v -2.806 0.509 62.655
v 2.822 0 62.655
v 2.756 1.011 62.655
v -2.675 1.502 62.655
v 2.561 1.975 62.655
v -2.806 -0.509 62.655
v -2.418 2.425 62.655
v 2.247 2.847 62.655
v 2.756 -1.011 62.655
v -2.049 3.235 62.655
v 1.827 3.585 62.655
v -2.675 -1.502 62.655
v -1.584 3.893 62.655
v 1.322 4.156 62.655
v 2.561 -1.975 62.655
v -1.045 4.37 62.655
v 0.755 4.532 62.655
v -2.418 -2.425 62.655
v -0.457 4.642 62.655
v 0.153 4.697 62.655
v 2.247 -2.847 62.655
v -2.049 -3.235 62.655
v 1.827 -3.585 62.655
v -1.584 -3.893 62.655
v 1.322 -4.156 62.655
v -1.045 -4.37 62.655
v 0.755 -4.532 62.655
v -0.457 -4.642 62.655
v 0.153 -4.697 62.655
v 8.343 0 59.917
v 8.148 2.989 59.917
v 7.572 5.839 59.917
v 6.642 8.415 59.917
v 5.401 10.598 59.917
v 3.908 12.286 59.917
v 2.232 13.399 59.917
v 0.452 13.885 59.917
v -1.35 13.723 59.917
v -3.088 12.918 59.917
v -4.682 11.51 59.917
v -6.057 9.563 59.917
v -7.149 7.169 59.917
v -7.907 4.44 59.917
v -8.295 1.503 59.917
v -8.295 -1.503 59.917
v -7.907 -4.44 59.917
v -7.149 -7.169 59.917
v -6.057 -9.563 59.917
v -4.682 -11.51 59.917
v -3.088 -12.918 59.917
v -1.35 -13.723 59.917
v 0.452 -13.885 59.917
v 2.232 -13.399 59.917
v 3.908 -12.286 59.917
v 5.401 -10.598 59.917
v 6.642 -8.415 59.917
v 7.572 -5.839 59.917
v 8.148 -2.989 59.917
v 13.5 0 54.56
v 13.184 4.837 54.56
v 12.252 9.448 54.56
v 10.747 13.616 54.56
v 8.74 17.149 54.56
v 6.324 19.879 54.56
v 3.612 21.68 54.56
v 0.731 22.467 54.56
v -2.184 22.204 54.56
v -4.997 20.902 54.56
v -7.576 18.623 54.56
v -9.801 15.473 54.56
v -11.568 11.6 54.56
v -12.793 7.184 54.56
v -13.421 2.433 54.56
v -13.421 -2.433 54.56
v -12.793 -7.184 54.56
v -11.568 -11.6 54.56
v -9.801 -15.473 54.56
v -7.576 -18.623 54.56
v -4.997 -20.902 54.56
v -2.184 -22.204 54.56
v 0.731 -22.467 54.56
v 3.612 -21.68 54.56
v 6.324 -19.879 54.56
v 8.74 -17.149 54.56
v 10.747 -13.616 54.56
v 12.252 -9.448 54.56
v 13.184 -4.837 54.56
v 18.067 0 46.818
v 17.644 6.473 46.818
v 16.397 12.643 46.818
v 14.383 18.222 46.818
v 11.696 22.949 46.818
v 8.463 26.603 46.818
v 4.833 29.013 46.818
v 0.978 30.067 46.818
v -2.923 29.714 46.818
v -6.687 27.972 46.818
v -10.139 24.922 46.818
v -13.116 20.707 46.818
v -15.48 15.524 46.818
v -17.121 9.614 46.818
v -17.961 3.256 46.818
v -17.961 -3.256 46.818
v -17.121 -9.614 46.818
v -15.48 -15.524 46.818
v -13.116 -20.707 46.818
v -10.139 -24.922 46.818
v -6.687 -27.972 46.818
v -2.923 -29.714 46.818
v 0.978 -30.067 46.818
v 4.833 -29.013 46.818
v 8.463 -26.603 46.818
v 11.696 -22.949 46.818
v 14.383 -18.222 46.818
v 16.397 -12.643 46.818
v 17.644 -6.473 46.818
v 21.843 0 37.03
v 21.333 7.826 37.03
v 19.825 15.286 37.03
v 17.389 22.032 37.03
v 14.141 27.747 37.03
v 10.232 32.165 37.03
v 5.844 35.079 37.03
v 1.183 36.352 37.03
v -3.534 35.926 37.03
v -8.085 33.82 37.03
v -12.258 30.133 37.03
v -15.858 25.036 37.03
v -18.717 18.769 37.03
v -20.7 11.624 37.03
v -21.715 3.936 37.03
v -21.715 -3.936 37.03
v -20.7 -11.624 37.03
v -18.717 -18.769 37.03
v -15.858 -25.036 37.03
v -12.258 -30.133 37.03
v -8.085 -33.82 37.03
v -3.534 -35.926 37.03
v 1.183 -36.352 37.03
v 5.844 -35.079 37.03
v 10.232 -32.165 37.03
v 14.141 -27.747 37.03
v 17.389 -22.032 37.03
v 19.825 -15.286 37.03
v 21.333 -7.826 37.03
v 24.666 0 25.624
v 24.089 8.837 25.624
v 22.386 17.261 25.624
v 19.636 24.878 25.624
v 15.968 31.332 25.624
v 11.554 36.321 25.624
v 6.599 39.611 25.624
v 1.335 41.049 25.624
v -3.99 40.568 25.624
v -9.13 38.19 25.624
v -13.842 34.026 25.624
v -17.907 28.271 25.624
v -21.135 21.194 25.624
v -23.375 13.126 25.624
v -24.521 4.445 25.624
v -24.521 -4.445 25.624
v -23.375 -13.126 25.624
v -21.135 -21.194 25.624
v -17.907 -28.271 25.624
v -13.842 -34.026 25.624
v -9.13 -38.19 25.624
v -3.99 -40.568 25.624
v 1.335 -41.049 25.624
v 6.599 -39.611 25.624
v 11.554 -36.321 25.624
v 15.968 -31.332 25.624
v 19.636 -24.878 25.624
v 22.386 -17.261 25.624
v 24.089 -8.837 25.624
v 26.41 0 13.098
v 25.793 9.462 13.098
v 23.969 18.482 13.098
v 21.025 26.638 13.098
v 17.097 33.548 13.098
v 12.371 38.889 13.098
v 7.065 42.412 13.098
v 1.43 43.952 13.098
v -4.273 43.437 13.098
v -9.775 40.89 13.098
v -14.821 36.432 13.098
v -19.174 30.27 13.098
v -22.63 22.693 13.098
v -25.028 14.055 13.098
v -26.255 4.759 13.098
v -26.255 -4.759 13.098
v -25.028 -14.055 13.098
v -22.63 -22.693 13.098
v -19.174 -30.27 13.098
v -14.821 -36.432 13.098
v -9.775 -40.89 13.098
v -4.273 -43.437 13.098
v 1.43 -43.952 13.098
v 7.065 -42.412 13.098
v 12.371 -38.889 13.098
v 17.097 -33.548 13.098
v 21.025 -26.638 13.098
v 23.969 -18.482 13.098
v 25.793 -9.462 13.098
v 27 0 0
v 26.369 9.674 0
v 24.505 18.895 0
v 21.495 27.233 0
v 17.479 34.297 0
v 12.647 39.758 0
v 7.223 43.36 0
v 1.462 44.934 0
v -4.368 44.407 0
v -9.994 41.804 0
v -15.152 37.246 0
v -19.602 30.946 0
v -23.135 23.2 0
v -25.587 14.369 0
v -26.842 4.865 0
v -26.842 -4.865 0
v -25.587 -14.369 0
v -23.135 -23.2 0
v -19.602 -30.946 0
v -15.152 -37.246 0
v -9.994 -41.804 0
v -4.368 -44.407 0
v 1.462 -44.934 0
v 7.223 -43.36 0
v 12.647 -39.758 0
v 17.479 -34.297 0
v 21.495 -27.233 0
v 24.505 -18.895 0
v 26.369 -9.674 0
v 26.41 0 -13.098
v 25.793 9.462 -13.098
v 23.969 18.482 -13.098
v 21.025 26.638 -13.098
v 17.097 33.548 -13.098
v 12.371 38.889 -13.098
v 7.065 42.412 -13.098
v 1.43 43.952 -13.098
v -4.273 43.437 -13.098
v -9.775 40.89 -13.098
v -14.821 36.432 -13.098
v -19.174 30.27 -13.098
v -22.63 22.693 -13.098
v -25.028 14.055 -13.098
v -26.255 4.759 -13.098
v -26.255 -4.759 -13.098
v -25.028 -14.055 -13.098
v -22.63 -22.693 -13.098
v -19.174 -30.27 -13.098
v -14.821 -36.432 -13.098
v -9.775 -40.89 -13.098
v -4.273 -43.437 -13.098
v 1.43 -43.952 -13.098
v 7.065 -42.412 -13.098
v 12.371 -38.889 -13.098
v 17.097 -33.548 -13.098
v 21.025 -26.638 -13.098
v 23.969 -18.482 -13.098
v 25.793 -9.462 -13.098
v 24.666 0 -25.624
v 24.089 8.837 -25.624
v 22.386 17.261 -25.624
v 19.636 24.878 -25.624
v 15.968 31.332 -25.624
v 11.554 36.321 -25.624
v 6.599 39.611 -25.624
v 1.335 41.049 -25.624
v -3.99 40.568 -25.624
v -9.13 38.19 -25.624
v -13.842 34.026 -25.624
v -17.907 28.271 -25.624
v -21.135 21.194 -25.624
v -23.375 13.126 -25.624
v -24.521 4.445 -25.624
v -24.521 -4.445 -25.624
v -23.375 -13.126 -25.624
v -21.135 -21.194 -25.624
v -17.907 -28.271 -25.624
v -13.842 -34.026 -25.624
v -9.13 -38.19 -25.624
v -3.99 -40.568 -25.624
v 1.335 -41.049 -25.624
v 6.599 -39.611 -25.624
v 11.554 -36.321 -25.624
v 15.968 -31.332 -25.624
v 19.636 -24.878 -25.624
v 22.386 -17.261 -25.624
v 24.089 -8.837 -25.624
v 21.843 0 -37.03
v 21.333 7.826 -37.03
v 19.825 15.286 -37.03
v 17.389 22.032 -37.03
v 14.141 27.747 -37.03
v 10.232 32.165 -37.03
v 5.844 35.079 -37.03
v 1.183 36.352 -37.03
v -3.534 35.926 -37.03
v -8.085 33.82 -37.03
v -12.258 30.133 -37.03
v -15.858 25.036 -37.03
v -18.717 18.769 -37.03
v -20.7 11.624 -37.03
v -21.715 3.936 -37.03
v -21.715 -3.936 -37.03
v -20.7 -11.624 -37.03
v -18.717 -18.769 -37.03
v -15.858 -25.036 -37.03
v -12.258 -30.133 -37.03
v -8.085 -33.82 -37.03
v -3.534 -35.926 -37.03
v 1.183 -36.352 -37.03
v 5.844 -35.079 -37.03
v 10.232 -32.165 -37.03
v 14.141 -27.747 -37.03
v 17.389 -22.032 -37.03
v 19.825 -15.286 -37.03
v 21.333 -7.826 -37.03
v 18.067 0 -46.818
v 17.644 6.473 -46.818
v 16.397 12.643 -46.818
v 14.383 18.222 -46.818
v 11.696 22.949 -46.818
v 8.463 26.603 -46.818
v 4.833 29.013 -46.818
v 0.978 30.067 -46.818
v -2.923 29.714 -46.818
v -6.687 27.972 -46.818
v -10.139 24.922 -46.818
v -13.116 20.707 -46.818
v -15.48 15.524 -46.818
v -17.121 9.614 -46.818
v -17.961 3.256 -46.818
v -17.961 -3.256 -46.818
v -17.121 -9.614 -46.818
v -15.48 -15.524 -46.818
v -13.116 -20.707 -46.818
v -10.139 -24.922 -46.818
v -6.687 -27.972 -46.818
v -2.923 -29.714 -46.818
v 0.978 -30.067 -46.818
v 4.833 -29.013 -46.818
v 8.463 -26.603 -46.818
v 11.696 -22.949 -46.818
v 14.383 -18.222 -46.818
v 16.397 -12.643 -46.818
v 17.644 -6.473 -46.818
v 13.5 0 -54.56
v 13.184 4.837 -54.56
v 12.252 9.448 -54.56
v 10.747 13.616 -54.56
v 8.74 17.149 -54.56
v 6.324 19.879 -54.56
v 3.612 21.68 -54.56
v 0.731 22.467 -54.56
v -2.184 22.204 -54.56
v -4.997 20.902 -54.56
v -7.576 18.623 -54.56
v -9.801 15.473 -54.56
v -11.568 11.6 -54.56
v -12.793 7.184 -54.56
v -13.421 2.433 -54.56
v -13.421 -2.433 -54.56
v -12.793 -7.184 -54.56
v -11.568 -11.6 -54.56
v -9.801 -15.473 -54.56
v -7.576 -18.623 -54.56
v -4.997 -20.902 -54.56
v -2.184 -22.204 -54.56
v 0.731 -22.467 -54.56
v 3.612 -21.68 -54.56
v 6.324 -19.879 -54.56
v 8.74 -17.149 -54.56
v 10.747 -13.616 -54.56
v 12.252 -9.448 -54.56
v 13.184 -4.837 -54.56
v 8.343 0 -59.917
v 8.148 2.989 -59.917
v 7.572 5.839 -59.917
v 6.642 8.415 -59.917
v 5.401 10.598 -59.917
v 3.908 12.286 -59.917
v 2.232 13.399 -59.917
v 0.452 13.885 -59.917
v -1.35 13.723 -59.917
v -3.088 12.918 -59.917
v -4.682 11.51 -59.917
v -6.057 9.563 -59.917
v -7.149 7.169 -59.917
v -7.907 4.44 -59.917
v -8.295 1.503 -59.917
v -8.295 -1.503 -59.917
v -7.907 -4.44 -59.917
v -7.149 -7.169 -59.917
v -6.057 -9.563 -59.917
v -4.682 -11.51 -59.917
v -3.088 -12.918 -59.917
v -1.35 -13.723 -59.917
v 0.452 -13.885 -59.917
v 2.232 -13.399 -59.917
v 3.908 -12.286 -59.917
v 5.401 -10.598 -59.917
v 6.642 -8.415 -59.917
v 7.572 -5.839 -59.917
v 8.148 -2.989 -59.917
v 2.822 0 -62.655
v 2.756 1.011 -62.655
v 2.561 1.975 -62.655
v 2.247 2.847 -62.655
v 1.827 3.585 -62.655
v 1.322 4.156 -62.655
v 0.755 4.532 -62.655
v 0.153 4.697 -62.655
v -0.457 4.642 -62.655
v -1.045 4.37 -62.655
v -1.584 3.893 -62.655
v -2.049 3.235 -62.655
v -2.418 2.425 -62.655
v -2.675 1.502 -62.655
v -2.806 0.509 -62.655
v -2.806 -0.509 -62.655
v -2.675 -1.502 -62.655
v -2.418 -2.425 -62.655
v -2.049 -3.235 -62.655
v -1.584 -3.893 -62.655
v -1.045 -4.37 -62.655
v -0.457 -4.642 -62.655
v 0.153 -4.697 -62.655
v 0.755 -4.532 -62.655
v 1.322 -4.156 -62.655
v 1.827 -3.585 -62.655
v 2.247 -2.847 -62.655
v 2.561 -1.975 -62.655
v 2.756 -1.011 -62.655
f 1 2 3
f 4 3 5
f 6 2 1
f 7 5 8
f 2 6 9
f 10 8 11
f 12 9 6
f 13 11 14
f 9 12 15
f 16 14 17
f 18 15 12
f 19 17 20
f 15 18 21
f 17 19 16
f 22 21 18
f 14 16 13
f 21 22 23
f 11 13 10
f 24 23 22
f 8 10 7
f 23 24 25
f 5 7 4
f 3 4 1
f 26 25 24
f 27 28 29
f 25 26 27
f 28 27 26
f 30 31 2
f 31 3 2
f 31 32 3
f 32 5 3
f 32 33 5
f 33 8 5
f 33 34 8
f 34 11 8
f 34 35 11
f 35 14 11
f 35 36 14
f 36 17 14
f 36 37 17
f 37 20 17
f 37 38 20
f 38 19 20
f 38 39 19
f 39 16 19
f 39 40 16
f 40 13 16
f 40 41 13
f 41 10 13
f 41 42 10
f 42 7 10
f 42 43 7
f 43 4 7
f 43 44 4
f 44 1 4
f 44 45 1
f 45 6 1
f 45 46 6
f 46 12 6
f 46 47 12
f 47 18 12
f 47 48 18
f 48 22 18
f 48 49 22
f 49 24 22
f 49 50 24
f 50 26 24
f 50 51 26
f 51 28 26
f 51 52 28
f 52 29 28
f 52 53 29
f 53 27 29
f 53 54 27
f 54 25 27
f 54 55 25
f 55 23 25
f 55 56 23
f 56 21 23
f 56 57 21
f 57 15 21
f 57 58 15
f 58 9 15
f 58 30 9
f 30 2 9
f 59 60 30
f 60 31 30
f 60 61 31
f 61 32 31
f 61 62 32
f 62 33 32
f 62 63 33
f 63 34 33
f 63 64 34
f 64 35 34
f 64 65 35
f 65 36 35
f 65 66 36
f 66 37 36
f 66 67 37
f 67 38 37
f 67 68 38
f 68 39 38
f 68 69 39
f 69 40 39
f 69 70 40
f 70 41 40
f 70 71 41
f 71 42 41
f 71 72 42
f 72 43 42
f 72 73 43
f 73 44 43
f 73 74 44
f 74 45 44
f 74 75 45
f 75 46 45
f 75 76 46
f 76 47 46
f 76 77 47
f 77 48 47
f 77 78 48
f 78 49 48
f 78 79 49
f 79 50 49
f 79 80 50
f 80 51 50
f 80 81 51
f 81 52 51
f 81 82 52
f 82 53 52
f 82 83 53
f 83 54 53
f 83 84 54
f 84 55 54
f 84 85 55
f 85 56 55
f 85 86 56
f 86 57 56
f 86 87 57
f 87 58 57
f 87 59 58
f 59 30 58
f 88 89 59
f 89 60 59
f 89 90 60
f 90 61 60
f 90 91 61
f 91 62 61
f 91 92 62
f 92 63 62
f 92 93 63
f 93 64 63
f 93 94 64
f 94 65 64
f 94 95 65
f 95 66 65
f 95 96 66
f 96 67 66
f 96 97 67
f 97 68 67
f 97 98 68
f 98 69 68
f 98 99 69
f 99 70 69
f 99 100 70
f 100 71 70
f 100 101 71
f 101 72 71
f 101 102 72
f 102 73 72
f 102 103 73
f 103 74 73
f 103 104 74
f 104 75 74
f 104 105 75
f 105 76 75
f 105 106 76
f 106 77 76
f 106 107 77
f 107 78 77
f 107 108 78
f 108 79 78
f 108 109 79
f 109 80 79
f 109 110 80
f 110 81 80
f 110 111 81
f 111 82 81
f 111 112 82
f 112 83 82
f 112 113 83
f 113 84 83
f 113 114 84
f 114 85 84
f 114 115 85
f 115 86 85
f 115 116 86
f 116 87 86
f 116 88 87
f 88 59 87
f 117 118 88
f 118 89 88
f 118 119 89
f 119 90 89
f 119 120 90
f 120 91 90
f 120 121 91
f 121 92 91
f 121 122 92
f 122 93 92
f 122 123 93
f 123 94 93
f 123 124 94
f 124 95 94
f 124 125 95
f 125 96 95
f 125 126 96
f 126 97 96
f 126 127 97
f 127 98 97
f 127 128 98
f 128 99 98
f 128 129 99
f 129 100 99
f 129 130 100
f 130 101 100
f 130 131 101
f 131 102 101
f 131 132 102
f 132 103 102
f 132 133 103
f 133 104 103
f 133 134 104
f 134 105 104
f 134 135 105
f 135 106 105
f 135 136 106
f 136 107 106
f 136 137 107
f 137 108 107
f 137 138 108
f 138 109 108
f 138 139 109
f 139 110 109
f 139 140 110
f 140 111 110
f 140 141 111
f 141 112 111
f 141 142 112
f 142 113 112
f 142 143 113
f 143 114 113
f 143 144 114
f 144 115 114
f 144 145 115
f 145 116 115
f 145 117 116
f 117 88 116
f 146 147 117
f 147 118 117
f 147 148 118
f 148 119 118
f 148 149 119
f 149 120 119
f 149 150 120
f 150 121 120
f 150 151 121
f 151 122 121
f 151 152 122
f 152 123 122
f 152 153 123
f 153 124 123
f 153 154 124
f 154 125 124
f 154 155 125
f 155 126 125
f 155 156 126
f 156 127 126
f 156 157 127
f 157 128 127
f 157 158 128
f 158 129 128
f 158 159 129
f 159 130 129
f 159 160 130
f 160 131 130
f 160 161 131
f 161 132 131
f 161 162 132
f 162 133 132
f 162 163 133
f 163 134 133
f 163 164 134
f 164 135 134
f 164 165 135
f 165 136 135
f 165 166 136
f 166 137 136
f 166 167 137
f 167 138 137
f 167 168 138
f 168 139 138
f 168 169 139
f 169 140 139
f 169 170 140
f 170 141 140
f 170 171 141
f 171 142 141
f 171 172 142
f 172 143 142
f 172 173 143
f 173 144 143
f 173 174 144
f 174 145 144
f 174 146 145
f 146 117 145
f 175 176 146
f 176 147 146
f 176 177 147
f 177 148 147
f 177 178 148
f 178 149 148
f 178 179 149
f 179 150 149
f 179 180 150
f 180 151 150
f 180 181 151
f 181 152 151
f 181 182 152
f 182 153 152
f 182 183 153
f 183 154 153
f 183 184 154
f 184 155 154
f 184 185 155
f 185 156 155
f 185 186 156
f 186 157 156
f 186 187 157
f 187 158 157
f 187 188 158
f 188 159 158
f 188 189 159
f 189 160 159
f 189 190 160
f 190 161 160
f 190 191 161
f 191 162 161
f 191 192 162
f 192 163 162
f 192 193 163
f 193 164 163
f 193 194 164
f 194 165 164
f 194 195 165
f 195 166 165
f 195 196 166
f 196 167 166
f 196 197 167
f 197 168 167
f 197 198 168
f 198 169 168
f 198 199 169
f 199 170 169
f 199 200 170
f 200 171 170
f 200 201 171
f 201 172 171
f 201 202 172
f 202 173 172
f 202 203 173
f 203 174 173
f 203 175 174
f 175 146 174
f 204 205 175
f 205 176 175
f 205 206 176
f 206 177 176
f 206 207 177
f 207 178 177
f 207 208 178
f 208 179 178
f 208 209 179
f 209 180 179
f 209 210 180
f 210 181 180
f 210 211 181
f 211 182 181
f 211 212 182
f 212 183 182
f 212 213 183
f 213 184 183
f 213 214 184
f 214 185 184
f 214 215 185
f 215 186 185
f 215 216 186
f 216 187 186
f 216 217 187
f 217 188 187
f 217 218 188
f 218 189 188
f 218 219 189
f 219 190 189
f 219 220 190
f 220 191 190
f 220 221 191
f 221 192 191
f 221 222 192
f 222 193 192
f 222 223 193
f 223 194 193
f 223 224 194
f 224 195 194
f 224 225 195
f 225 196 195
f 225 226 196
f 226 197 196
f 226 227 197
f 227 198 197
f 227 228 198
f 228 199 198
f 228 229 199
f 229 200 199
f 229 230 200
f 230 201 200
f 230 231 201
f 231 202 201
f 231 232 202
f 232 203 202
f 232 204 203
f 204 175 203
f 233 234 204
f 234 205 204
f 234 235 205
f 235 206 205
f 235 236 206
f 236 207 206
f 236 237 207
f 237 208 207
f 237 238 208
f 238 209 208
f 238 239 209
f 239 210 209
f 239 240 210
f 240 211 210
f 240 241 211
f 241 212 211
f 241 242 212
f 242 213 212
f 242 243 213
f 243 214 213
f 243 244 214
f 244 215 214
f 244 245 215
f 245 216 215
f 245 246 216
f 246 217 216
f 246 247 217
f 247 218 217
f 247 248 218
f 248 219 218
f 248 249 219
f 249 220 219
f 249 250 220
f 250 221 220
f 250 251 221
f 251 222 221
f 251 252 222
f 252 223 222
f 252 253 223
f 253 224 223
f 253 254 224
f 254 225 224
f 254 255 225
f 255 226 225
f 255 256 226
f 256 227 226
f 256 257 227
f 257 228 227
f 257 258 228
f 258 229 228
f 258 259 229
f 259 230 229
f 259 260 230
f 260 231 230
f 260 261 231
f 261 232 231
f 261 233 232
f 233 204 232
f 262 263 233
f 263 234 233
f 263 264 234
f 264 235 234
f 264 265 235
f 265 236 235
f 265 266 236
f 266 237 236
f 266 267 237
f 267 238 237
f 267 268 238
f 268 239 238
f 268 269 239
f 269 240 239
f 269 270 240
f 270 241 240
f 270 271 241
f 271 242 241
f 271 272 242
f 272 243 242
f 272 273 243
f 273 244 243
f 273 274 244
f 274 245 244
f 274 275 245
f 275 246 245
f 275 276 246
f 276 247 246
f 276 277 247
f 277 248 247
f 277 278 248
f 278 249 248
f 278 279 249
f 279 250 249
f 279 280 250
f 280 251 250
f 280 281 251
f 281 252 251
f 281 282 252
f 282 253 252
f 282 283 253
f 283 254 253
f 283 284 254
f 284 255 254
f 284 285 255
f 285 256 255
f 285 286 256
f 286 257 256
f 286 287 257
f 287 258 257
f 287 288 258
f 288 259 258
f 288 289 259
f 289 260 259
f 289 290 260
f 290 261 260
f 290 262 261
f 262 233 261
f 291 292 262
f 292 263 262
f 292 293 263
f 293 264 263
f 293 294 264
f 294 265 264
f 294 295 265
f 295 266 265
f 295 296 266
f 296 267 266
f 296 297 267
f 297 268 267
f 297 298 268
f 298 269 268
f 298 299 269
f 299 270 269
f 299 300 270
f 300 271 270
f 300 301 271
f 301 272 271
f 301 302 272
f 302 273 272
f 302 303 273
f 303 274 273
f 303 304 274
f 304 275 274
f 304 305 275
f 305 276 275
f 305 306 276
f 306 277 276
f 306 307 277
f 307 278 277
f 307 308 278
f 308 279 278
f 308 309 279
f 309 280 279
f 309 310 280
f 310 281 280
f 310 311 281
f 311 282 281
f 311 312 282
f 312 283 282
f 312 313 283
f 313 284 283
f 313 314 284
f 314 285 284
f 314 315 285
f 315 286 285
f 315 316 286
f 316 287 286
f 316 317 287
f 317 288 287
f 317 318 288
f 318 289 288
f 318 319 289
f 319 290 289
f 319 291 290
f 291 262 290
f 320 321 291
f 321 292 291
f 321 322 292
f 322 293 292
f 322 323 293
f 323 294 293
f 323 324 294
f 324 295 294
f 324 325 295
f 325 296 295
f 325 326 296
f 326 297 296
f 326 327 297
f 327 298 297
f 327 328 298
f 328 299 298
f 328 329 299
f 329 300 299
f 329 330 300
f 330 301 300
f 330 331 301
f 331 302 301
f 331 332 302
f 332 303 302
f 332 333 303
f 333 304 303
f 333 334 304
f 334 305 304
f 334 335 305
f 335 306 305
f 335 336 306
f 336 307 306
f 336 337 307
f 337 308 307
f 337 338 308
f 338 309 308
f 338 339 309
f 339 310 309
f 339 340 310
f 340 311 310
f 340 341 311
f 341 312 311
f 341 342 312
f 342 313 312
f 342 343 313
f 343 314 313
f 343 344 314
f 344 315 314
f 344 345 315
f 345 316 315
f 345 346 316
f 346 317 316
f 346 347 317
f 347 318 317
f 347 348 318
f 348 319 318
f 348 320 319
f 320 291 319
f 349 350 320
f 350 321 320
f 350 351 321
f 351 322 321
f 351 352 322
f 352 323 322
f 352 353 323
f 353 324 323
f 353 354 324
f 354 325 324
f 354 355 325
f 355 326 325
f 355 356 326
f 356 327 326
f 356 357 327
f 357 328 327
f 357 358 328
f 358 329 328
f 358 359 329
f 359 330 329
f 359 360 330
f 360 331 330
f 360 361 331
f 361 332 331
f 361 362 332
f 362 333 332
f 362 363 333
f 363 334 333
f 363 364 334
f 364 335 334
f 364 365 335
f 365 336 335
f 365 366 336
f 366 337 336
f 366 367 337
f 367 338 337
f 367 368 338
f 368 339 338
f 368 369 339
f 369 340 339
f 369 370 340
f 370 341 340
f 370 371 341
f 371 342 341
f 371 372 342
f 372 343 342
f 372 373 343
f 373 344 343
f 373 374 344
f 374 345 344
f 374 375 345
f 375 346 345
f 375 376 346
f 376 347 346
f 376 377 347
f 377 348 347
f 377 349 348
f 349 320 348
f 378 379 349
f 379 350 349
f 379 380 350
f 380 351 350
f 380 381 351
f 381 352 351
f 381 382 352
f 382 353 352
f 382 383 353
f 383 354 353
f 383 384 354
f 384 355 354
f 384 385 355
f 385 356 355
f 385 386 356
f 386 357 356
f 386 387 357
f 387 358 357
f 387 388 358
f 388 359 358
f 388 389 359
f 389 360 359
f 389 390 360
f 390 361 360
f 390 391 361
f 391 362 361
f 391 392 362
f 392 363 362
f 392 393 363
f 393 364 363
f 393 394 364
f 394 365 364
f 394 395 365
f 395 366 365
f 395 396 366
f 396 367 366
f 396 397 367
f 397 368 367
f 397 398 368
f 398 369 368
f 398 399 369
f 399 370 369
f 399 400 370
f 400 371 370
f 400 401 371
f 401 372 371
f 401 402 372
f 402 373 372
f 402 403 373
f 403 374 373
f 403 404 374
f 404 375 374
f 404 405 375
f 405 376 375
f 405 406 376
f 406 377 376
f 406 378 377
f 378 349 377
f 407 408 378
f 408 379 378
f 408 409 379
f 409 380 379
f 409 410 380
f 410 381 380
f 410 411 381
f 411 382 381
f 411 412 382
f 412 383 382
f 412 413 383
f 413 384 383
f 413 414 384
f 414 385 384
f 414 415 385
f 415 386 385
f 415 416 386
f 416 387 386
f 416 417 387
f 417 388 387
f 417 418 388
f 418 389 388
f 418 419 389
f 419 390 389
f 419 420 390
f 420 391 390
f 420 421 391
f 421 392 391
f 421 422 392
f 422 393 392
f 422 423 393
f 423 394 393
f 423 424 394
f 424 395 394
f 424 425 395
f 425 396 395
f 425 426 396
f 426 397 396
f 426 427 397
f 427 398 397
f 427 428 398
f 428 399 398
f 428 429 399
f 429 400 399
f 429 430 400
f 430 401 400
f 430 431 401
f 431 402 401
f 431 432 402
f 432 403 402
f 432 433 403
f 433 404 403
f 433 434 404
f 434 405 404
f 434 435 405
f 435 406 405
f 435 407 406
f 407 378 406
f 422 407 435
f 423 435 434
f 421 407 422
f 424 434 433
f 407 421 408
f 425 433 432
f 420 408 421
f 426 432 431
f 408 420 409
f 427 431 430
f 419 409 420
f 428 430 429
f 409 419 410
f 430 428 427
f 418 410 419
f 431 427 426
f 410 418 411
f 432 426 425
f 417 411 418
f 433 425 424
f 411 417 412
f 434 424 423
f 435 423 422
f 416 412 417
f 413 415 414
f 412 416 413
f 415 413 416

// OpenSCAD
// Generated by SolidPython 1.0.1 on 2020-07-29 00:46:45


scale(v = [3, 5, 7]) {
	sphere(r = 9);
}
/***********************************************
*********      SolidPython code:      **********
************************************************
 
# import packages: SolidPython
from solid import *
from solid.utils import *
from itertools import chain, combinations, permutations


class Resize:

    def __init__(self, scad_file):
        self.scad_file = scad_file
        #self.scad_file = import_scad(scad_file)
        # cone/cylinder param:
        self.r1 = 0
        self.r2 = 0
        self.h = 0
        # rectangular prism param:
        self.w = 0
        self.l = 0
        # ellipse param:
        self.r = 0

    # import OpenScad code (file name corresponds to shape)


    # classify shape + parameters
    def assign(self, param1, param2, param3):
        if self.scad_file == 'cone.scad':
            self.r1 = param1
            self.r2 = param2
            self.h = param3
        elif self.scad_file == 'cylinder.scad':
            self.r1 = param1
            self.r2 = param2
            self.h = param3
        elif self.scad_file == 'rectangularPrism.scad':
            self.h = param1
            self.l = param2
            self.w = param3
        else:
            self.r = param1
            self.h = param2

    # resize parameters
    def iterate(self):
        x = range(3, 20, 2)
        i = 1
        if self.scad_file == 'cone.scad':
            tempList = list(permutations(x, 2))
            for temp in tempList:
                param1 = temp[0]
                param2 = temp[1]
                filepath = 'produced_scad_files/' + 'cone' + str(param1) + '_' + str(param2) + '_' + '.scad'
                scad_render_to_file(cylinder(h=param1, r1=param2, r2=0), filepath)

        elif self.scad_file == 'cylinder.scad':
            tempList = list(permutations(x, 3))
            for temp in tempList:
                param1 = temp[0]
                param2 = temp[1]
                filepath = 'produced_scad_files/' + 'cylinder' + str(param1) + '_' + str(param2) + '_' + '.scad'
                scad_render_to_file(cylinder(h=param1, r1=param2, r2=param2), filepath)

        elif self.scad_file == 'rectangularPrism.scad':
            tempList = list(permutations(x, 3))
            for temp in tempList:
                param1 = temp[0]
                param2 = temp[1]
                param3 = temp[2]
                filepath = 'produced_scad_files/' + 'rectangularPrism' + str(param1) + '_' + str(param2) + '_' + str(
                    param3) + '.scad'
                scad_render_to_file(cube(size=(param1, param2, param3)), filepath)

        elif self.scad_file == 'ellipse.scad':
            tempList = list(permutations(x, 4))
            for temp in tempList:
                param1 = temp[0]
                param2 = temp[1]
                param3 = temp[2]
                param4 = temp[3]
                filepath = 'produced_scad_files/' + 'ellipse' + str(param1) + '_' + str(param2) + '_' + str(param3) + '_' + str(param4) + '.scad'
                scad_render_to_file(scale([param1, param2, param3])(sphere(r=param4)), filepath)

    def render_to_scadfile(self):
        scad_render_to_file(scad, 'example.scad') 
 
************************************************/
